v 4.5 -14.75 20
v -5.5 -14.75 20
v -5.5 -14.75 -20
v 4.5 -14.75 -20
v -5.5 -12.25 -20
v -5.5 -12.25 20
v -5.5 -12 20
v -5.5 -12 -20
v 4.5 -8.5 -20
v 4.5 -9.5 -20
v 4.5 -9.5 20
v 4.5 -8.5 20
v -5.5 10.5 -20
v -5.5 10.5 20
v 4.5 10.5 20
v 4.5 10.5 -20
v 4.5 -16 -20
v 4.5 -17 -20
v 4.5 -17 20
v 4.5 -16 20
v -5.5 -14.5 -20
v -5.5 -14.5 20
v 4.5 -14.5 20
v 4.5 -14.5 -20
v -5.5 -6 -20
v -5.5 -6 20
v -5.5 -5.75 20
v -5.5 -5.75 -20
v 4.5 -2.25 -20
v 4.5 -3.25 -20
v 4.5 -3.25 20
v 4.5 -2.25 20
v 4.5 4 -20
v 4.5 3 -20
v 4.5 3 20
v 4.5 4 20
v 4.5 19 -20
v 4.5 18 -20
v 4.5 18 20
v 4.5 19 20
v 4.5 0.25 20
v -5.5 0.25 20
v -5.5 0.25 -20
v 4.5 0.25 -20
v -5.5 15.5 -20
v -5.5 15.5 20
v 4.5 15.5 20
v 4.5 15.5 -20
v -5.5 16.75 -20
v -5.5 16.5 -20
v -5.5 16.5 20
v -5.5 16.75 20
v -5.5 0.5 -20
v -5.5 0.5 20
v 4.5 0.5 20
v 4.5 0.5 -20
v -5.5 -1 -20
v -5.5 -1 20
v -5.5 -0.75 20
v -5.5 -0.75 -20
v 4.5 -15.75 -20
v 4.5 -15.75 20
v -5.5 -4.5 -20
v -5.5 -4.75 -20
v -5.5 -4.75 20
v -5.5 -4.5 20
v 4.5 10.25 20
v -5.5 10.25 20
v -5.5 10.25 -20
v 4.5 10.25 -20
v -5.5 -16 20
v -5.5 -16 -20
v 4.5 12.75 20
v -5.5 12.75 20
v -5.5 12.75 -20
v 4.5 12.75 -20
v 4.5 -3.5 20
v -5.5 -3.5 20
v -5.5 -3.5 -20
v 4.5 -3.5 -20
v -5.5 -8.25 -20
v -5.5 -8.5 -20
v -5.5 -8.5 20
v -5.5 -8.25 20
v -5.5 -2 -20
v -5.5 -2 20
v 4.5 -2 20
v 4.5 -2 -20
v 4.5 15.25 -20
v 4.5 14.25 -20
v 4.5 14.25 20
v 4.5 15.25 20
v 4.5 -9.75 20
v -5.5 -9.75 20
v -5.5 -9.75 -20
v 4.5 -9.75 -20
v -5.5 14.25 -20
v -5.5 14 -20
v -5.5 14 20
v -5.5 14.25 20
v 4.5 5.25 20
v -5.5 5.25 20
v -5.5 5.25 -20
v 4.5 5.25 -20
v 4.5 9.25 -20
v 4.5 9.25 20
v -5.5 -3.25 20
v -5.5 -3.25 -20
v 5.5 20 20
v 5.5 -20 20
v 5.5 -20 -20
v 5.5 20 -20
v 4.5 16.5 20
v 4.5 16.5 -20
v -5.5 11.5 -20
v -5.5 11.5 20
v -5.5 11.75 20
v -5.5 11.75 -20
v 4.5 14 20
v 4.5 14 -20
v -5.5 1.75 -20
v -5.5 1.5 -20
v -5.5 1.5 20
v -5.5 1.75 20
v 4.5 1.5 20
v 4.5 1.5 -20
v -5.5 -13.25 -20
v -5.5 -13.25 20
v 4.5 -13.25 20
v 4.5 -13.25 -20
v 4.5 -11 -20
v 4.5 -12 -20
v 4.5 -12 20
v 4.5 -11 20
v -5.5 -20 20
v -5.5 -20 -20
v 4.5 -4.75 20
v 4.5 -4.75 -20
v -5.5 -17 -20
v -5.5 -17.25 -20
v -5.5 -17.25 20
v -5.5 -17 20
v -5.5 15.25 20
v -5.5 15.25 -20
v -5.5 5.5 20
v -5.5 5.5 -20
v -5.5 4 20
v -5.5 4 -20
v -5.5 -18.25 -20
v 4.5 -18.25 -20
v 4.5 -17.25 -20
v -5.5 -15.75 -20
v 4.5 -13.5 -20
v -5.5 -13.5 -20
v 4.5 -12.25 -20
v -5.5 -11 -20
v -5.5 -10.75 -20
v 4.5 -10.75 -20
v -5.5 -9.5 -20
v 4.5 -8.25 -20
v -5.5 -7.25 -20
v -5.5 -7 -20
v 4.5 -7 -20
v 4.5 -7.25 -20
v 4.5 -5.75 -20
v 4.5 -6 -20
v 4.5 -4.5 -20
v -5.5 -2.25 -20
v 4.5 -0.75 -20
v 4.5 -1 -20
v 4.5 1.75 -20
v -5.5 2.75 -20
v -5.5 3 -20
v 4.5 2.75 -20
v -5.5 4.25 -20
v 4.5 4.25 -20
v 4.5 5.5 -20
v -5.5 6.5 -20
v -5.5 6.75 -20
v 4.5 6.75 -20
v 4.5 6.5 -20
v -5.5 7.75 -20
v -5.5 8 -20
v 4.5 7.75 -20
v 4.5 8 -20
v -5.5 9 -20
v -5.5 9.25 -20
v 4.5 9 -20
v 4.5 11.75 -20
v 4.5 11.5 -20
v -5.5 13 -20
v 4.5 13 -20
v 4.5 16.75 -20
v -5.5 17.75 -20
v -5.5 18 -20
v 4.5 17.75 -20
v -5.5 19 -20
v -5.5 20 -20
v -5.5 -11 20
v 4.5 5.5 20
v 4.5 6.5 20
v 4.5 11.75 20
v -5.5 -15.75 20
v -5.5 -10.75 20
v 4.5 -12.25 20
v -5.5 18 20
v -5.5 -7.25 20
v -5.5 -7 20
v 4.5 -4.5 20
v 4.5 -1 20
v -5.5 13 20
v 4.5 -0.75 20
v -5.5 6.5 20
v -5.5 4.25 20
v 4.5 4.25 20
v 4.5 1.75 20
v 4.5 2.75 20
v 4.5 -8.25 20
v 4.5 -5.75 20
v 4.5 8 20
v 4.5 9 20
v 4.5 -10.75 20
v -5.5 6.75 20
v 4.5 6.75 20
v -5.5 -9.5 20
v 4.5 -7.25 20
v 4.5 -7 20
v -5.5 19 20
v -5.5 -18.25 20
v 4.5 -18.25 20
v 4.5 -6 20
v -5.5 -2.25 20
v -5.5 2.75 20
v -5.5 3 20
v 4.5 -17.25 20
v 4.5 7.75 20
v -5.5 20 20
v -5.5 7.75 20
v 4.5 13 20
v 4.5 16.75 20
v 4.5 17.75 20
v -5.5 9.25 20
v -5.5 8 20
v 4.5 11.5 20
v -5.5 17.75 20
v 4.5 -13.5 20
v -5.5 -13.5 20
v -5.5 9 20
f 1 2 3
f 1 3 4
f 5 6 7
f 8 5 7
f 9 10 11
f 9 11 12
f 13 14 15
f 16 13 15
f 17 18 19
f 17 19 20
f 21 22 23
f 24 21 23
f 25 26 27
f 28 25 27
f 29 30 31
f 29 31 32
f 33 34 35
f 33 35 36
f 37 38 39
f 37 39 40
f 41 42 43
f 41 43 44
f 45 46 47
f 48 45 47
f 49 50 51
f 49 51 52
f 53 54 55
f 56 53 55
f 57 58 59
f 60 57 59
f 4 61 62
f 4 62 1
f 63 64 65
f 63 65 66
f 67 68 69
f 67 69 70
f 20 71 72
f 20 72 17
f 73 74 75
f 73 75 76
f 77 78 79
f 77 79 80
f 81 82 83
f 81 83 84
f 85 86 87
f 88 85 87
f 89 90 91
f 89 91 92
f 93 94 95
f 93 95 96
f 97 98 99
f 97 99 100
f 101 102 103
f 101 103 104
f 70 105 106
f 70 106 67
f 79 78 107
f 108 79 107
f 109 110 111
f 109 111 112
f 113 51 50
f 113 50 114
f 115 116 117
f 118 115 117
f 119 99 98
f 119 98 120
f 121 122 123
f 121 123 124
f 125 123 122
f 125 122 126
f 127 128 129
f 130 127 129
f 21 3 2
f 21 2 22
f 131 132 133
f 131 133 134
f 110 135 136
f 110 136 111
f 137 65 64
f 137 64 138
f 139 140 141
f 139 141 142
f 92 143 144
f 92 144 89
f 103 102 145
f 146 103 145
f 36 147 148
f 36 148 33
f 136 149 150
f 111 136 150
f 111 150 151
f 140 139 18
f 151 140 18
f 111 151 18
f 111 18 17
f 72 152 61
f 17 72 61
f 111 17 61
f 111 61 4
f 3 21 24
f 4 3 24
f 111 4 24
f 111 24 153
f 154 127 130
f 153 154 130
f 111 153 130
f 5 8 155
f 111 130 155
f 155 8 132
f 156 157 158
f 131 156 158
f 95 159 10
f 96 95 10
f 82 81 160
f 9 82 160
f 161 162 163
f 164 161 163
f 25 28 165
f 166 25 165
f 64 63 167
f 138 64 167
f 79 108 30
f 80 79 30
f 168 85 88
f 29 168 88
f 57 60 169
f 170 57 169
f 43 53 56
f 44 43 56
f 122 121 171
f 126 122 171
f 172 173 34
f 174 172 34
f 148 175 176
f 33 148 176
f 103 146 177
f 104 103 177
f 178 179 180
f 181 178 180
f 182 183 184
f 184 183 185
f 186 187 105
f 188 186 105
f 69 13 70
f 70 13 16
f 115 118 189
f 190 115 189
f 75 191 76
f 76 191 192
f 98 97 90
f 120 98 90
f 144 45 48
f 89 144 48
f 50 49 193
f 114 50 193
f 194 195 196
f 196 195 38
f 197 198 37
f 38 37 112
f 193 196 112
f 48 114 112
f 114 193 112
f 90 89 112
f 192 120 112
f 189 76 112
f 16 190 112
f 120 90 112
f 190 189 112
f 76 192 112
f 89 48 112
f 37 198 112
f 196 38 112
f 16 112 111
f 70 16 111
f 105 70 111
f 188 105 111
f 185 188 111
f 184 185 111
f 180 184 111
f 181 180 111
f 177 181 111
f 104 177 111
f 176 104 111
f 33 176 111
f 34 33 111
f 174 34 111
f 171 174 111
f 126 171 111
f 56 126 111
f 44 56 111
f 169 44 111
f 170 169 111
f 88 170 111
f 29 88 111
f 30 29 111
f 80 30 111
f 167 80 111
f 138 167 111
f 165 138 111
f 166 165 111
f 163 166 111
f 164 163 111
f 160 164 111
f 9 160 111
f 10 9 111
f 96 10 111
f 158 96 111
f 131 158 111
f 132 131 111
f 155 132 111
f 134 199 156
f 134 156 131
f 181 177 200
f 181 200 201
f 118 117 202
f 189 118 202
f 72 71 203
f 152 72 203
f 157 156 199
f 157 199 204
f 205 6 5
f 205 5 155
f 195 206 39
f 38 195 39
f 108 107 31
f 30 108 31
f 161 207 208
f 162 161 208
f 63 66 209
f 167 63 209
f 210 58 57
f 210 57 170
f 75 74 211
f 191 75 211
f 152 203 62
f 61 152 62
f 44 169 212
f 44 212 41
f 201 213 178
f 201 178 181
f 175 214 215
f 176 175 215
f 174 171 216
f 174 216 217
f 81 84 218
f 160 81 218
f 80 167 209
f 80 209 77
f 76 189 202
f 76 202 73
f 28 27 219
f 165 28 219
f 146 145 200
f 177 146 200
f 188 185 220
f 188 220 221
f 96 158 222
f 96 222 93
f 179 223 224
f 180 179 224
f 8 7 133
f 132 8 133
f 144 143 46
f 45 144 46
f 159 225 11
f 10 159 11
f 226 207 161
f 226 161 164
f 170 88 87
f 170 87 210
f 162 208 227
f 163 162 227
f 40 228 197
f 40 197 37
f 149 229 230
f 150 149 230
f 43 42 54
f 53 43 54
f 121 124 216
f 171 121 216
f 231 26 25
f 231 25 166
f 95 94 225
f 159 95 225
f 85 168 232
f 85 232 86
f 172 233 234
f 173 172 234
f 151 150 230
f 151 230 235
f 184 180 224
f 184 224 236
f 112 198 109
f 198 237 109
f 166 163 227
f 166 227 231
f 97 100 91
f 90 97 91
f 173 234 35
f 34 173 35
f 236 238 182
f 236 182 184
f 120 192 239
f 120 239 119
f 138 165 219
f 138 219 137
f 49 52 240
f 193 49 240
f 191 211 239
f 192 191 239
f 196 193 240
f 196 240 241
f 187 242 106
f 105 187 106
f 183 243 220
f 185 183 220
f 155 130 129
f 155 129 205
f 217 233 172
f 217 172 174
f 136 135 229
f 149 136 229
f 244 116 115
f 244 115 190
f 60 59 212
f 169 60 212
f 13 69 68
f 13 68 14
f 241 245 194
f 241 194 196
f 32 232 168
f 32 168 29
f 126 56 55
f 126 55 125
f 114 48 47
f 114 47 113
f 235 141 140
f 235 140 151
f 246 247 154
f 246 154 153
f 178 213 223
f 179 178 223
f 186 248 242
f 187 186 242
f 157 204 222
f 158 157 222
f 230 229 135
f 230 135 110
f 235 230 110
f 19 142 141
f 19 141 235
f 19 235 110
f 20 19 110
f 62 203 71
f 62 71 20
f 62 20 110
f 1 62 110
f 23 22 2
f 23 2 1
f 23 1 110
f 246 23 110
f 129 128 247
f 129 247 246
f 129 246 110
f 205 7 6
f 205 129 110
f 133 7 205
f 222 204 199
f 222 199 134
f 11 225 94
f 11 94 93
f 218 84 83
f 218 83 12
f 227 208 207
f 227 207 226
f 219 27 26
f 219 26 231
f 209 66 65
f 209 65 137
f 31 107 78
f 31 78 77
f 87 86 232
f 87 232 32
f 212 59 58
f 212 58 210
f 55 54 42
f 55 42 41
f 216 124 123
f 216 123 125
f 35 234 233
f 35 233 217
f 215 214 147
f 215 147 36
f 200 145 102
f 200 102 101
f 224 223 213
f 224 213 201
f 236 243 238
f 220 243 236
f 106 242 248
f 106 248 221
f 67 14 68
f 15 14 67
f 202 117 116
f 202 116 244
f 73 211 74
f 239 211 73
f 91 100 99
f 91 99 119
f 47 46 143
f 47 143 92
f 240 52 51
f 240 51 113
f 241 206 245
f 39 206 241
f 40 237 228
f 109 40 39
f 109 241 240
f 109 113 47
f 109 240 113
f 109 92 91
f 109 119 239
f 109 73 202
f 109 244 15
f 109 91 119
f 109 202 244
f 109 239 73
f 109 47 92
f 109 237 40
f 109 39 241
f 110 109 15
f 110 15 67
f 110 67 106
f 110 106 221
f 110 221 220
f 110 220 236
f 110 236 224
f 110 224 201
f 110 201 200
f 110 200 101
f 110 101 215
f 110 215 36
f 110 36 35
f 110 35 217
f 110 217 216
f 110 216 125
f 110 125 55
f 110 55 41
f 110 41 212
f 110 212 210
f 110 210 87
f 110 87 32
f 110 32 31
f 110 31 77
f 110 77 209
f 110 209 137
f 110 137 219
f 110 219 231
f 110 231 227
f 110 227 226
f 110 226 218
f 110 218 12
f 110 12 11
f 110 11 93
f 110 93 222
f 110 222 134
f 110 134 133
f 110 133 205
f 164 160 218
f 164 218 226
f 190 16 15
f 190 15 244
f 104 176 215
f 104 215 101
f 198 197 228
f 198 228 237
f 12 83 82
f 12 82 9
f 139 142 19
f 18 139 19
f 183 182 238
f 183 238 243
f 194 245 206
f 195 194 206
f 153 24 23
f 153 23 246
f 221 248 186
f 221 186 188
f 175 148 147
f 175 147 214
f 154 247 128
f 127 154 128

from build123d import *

# Parameters (mm, degrees)
SKETCH1_W           = 11
SKETCH1_H           = 40
BOSS_EXTRUDE1_DEPTH = 20
SKETCH2_W           = 10
SKETCH2_H           = 1
CUT_EXTRUDE2_DEPTH  = 40


with BuildPart() as part:
    # Sketch1 → Boss-Extrude1 (new, symmetric)
    with BuildSketch(Plane.XY):
        Rectangle(SKETCH1_W, SKETCH1_H)
    extrude(amount=BOSS_EXTRUDE1_DEPTH, both=True)

    # Sketch2 → Cut-Extrude2 (cut)
    with BuildSketch(Plane.XY.offset(20)):
        with Locations((-0.5, 18.5)):
            Rectangle(SKETCH2_W, SKETCH2_H)
        with Locations((-0.5, 17.250002203)):
            Rectangle(SKETCH2_W, SKETCH2_H)
        with Locations((-0.5, 16.000004405)):
            Rectangle(SKETCH2_W, SKETCH2_H)
        with Locations((-0.5, 14.750006608)):
            Rectangle(SKETCH2_W, SKETCH2_H)
        with Locations((-0.5, 13.50000881)):
            Rectangle(SKETCH2_W, SKETCH2_H)
        with Locations((-0.5, 12.250011013)):
            Rectangle(SKETCH2_W, SKETCH2_H)
        with Locations((-0.5, 11.000013216)):
            Rectangle(SKETCH2_W, SKETCH2_H)
        with Locations((-0.5, 9.750015418)):
            Rectangle(SKETCH2_W, SKETCH2_H)
        with Locations((-0.5, 8.500017621)):
            Rectangle(SKETCH2_W, SKETCH2_H)
        with Locations((-0.5, 7.250019823)):
            Rectangle(SKETCH2_W, SKETCH2_H)
        with Locations((-0.5, 6.000022026)):
            Rectangle(SKETCH2_W, SKETCH2_H)
        with Locations((-0.5, 4.750024229)):
            Rectangle(SKETCH2_W, SKETCH2_H)
        with Locations((-0.5, 3.500026431)):
            Rectangle(SKETCH2_W, SKETCH2_H)
        with Locations((-0.5, 2.250028634)):
            Rectangle(SKETCH2_W, SKETCH2_H)
        with Locations((-0.5, 1.000030836)):
            Rectangle(SKETCH2_W, SKETCH2_H)
        with Locations((-0.5, -0.249966961)):
            Rectangle(SKETCH2_W, SKETCH2_H)
        with Locations((-0.5, -1.499964758)):
            Rectangle(SKETCH2_W, SKETCH2_H)
        with Locations((-0.5, -2.749962556)):
            Rectangle(SKETCH2_W, SKETCH2_H)
        with Locations((-0.5, -3.999960353)):
            Rectangle(SKETCH2_W, SKETCH2_H)
        with Locations((-0.5, -5.249958151)):
            Rectangle(SKETCH2_W, SKETCH2_H)
        with Locations((-0.5, -6.499955948)):
            Rectangle(SKETCH2_W, SKETCH2_H)
        with Locations((-0.5, -7.749953745)):
            Rectangle(SKETCH2_W, SKETCH2_H)
        with Locations((-0.5, -8.999951543)):
            Rectangle(SKETCH2_W, SKETCH2_H)
        with Locations((-0.5, -10.24994934)):
            Rectangle(SKETCH2_W, SKETCH2_H)
        with Locations((-0.5, -11.499947138)):
            Rectangle(SKETCH2_W, SKETCH2_H)
        with Locations((-0.5, -12.749944935)):
            Rectangle(SKETCH2_W, SKETCH2_H)
        with Locations((-0.5, -13.999942732)):
            Rectangle(SKETCH2_W, SKETCH2_H)
        with Locations((-0.5, -15.24994053)):
            Rectangle(SKETCH2_W, SKETCH2_H)
        with Locations((-0.5, -16.499938327)):
            Rectangle(SKETCH2_W, SKETCH2_H)
        with Locations((-0.5, -17.749936125)):
            Rectangle(SKETCH2_W, SKETCH2_H)
    extrude(amount=-CUT_EXTRUDE2_DEPTH, mode=Mode.SUBTRACT)


solid = part.part
